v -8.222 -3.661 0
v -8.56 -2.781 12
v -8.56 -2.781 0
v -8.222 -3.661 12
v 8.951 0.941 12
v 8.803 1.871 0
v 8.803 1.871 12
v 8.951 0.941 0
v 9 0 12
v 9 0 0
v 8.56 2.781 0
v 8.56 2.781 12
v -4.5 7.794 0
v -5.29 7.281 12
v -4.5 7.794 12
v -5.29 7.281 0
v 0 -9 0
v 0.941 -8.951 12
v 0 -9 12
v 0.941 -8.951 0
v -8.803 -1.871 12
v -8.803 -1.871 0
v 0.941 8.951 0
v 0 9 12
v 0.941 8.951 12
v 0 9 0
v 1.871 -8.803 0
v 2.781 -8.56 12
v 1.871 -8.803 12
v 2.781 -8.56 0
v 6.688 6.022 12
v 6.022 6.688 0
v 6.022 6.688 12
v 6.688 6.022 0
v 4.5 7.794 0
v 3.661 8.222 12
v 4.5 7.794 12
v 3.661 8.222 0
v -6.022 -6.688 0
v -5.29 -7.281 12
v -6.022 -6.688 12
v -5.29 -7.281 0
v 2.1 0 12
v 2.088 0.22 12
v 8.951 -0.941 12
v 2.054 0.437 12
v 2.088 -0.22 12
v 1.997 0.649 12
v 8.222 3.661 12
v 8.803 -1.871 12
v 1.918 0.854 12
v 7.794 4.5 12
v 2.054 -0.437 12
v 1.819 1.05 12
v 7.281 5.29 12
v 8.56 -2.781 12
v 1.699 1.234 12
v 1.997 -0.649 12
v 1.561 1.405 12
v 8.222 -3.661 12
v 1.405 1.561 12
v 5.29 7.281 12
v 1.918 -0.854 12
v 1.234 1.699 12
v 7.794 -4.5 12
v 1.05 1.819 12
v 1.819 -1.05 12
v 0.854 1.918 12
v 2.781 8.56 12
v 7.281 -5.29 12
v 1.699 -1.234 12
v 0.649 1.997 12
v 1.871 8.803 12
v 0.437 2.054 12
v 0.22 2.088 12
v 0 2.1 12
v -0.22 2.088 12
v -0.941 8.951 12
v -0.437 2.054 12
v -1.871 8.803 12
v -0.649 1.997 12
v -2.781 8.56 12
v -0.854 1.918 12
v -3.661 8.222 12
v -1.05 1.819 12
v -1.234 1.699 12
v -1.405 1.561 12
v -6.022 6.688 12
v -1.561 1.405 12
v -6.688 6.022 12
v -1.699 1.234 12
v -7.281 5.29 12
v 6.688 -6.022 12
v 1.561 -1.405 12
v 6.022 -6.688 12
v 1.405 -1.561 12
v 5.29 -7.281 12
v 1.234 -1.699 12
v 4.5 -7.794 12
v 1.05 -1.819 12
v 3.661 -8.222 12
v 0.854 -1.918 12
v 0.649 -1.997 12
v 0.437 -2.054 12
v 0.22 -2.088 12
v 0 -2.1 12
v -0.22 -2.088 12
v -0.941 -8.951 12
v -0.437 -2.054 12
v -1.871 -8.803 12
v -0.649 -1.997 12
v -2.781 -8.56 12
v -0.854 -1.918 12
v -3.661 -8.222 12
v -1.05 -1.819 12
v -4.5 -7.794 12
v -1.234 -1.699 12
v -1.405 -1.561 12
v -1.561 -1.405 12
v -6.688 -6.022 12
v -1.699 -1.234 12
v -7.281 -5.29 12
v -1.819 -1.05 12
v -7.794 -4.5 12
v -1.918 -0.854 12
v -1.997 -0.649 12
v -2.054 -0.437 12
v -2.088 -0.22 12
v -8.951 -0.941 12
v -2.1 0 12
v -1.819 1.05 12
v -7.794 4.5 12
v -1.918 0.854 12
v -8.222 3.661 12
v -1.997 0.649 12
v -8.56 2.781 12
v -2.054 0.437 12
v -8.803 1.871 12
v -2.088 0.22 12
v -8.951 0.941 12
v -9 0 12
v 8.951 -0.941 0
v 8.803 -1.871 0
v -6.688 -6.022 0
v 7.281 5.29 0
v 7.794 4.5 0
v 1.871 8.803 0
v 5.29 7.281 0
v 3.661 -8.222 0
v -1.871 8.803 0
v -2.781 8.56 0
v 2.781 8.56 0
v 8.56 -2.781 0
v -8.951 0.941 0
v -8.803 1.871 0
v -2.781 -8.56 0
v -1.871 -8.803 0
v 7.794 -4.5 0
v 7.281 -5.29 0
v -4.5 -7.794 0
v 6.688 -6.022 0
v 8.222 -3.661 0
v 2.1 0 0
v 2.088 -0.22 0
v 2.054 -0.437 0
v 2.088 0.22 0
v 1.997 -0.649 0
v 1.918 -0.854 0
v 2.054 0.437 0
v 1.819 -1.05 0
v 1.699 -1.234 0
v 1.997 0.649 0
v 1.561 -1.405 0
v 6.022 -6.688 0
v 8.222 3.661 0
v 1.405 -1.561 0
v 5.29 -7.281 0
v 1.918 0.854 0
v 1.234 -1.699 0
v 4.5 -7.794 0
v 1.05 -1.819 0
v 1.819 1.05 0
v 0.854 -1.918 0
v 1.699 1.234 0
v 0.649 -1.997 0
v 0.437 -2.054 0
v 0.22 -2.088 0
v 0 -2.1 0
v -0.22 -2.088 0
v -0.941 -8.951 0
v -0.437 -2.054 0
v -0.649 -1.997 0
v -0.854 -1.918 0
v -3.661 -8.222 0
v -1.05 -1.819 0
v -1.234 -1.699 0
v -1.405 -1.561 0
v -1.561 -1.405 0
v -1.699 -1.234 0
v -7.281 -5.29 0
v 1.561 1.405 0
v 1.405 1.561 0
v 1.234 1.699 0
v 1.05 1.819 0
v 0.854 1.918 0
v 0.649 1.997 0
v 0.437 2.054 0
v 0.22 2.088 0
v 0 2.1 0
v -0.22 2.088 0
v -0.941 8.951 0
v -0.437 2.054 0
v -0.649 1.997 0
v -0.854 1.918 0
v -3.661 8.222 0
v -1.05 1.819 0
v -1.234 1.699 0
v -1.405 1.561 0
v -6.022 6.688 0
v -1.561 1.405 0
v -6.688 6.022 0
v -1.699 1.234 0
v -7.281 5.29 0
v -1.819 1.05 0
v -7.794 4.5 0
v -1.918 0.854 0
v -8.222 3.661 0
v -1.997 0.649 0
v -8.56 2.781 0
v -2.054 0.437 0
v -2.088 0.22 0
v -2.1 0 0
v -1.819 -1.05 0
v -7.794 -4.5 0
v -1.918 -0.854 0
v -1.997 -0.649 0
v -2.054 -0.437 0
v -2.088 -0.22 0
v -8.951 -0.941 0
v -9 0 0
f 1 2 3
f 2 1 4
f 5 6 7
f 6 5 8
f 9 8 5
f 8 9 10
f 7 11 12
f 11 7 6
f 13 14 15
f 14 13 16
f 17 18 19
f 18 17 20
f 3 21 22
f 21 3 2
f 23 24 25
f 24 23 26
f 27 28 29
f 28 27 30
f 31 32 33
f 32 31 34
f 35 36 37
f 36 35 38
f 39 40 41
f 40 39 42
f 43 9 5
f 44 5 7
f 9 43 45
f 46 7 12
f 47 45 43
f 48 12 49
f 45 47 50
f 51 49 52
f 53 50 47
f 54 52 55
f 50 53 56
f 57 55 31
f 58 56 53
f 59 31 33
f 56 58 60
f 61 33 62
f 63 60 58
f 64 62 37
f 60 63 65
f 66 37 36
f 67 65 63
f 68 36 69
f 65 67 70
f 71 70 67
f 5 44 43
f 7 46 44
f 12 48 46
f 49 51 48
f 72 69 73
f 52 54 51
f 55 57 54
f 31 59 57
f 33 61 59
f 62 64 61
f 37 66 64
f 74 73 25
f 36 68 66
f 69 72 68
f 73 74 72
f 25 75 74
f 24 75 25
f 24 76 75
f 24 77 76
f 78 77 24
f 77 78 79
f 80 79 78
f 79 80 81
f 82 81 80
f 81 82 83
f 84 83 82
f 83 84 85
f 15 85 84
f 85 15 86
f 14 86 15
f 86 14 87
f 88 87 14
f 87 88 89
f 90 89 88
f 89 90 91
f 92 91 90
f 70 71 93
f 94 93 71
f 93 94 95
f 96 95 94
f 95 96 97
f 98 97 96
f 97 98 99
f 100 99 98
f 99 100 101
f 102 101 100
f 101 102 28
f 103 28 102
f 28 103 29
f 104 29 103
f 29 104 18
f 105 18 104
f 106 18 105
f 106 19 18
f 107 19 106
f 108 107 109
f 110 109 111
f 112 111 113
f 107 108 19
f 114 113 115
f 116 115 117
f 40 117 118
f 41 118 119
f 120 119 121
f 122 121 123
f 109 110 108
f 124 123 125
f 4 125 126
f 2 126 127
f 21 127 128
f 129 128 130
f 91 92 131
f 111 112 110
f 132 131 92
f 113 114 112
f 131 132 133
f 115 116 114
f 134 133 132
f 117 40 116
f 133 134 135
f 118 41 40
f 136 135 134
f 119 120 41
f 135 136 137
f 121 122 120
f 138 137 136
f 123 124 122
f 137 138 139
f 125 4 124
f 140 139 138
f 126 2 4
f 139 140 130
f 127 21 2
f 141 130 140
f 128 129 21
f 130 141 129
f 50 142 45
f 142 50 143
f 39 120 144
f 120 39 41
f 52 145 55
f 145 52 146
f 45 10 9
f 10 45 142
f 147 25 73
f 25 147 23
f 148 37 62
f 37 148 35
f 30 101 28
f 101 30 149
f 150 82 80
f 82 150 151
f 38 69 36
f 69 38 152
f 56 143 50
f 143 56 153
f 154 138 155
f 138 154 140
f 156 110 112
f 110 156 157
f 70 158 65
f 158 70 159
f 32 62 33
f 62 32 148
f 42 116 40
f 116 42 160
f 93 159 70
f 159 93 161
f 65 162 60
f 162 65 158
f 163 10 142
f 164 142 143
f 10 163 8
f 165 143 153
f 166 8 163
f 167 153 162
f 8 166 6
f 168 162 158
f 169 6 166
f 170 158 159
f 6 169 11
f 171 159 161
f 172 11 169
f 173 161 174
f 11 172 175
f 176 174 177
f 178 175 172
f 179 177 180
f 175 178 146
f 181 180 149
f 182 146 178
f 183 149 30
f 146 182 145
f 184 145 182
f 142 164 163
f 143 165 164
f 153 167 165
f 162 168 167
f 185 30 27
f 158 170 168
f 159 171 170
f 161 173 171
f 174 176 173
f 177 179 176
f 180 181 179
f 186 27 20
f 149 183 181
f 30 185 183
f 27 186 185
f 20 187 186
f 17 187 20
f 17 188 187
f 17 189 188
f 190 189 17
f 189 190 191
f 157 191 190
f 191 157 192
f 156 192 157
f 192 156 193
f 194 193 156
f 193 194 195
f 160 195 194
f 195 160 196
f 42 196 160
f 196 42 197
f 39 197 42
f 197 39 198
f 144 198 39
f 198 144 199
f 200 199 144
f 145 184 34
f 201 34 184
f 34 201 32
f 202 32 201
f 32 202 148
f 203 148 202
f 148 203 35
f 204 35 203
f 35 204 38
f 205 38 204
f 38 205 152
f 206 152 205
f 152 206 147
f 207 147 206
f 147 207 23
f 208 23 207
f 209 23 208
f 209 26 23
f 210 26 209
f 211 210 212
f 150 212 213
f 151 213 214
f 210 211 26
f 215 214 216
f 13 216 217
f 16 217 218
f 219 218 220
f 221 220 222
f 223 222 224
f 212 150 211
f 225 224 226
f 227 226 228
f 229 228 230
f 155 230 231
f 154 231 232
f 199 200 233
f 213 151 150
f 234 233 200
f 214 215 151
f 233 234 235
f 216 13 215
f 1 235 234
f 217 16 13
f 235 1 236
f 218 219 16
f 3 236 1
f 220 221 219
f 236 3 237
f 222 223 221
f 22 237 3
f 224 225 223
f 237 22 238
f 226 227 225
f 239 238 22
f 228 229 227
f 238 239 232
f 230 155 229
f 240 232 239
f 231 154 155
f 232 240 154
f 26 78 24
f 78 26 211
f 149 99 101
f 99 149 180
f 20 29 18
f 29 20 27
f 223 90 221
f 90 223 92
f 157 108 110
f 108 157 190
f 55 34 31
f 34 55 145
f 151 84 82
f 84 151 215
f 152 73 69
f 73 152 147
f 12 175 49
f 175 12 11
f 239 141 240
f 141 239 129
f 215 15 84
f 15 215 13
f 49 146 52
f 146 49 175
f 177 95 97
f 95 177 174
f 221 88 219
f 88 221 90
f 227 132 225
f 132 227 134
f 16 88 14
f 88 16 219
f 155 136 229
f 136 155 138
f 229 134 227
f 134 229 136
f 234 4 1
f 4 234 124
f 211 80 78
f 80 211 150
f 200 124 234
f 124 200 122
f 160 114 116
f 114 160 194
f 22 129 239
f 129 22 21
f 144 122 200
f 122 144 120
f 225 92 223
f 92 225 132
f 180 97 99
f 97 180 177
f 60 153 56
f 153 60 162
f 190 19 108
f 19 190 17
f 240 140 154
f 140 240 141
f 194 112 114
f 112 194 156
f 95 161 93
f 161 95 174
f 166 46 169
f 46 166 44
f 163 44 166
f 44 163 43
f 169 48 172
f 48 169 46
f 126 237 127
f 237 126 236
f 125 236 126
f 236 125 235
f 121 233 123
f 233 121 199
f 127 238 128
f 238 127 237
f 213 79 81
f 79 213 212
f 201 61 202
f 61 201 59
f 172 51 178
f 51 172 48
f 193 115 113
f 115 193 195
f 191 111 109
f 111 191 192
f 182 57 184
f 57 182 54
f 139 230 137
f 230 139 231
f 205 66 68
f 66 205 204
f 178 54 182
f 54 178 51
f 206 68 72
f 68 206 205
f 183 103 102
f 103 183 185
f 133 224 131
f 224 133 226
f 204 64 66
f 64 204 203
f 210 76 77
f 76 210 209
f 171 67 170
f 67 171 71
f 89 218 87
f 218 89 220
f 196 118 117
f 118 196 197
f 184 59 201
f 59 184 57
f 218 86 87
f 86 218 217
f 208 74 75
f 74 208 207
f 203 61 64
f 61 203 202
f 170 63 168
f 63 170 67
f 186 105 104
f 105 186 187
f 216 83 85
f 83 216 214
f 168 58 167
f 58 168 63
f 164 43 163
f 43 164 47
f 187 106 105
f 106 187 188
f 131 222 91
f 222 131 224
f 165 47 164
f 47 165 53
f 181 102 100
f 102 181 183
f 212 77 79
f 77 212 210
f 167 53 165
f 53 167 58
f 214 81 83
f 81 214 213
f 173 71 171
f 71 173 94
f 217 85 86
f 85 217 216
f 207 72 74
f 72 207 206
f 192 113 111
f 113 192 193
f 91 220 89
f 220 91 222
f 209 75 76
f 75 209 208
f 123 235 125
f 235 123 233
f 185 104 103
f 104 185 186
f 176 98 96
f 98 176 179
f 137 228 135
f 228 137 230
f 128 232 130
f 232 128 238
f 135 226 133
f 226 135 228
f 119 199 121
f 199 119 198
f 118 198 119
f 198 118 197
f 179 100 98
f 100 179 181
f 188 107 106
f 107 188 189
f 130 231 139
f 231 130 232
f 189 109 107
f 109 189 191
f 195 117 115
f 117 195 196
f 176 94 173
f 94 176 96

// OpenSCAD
$fn = 60;

base_thick = 2.0;

//--------------------------------------------------------

rail_distance();

//--------------------------------------------------------

module rail_distance() {
	  w = 18;
	  h = 12;
	  difference() {
			cylinder(h=h, d=w);
			cylinder(h=h, d=4.2);
	  }
}

//--------------------------------------------------------
